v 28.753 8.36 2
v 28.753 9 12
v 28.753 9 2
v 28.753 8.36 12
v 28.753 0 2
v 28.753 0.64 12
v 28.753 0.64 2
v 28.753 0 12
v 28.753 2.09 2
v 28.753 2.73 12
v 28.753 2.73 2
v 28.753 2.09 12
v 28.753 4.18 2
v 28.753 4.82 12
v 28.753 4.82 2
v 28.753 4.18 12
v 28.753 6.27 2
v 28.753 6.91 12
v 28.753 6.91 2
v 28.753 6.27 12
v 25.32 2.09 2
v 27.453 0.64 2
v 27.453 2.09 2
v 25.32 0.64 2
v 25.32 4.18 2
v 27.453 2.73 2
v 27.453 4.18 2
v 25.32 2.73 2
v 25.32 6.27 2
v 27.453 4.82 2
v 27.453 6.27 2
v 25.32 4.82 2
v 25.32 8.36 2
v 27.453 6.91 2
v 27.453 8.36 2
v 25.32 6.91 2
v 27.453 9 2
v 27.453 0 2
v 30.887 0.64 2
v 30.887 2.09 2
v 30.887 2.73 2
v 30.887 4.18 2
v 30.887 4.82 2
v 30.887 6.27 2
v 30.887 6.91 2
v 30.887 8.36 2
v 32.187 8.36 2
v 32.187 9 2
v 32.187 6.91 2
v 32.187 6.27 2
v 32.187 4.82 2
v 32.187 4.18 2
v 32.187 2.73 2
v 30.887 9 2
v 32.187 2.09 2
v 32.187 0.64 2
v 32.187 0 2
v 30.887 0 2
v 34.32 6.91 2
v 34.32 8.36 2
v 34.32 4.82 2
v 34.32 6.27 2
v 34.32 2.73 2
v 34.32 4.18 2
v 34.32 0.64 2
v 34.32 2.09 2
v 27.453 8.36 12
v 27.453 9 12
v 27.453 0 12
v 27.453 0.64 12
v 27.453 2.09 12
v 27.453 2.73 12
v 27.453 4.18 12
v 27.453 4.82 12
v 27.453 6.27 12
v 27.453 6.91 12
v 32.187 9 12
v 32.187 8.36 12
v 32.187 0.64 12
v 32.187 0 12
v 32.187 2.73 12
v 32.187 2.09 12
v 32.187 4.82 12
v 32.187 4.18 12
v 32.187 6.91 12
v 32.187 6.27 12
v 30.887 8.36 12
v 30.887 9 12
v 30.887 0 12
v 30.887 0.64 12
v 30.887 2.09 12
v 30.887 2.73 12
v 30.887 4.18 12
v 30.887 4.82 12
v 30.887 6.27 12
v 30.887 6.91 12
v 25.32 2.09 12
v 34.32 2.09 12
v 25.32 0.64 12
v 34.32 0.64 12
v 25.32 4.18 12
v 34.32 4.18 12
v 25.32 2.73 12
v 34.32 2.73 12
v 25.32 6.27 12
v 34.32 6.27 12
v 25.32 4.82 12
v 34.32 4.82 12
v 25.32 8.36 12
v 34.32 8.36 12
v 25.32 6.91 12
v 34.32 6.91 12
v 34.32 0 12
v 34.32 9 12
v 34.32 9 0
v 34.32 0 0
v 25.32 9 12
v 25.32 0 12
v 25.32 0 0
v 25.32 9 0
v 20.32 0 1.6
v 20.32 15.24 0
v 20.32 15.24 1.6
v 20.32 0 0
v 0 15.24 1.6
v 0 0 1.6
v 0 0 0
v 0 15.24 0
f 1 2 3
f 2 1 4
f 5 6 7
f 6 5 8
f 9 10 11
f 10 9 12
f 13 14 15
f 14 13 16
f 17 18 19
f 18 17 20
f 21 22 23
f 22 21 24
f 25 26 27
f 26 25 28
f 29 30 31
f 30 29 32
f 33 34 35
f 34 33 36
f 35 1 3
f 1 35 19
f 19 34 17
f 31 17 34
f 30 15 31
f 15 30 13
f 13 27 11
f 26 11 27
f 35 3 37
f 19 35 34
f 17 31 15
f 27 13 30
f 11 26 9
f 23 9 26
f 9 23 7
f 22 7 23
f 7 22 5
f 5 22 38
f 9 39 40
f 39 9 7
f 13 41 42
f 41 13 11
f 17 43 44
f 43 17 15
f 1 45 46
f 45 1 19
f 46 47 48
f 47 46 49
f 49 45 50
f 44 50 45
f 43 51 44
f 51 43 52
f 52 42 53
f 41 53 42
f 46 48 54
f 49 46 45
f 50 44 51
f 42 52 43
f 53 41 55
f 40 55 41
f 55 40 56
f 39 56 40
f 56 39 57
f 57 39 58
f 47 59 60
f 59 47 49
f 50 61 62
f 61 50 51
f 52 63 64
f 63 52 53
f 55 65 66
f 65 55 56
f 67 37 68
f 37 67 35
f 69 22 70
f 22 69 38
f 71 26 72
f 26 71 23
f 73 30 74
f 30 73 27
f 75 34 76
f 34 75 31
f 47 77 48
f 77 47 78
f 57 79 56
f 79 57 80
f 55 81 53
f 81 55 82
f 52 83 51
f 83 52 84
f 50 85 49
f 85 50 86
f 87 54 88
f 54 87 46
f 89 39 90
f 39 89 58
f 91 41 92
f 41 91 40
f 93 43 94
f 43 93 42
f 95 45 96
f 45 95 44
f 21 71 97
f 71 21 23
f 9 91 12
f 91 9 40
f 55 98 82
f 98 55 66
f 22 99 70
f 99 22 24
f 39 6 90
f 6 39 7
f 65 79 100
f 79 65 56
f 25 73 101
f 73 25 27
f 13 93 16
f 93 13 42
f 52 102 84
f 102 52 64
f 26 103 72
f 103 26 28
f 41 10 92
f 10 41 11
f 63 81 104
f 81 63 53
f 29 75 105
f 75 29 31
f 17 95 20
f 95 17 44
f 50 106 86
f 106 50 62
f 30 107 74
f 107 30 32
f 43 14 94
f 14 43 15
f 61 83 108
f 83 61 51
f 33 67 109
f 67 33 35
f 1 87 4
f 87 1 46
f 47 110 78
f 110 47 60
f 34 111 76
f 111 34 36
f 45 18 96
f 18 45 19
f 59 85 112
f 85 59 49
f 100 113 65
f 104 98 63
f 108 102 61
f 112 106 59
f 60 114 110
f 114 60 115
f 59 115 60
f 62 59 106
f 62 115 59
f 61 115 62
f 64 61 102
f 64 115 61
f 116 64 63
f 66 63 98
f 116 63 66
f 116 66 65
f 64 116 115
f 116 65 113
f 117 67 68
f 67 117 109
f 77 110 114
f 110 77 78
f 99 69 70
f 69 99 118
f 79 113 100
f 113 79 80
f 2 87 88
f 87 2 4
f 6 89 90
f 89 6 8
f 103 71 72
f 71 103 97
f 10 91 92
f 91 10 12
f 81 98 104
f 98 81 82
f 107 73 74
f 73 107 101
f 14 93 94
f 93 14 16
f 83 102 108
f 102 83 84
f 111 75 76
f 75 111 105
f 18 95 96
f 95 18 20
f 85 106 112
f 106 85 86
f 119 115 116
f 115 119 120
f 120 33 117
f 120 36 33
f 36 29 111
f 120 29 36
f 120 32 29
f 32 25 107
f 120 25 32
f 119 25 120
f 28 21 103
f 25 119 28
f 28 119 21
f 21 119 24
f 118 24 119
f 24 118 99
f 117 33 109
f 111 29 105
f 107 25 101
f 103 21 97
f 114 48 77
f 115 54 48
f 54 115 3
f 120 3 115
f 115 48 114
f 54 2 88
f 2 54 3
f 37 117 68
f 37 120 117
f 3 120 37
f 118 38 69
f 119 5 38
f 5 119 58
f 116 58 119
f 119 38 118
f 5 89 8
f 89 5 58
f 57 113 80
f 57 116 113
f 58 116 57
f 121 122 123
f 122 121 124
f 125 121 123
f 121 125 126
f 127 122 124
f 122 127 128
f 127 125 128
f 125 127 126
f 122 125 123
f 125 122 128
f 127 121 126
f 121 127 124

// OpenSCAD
// file: ../settings/dimensions.scad
// Defualt Quality
$fn = 25;

// PCB Dimensions - mm
pcb_l = 109.67;
pcb_w = 84.30;
pcb_t = 1.6;

hole_dia = 3.2;
hole_x_spacing = 101.85;
hole_y_spacing = 76.10;

// PCB Component Locations - mm from center
usb_x = (-pcb_l/2) + 24.11;
usb_y = (-pcb_w/2);

uSD_x = (-pcb_l/2) + 42.46;
uSD_y = (-pcb_w/2) - 0.71;

// TMC2130 Dimensions - mm
tmc_l = 20.32;
tmc_w = 15.24;
tmc_t = 1.6;
// main file
include <../settings/dimensions.scad>

module tmc2130_pcb() {
    color("DimGrey") {
        cube([tmc_l, tmc_w, tmc_t]);
    }
}

module heatsink() {
    hs_l = 9.0;
    hs_w = 9.0;
    hs_h = 12.0;

    num_fin_y = 5;
    num_fin_x = 3;
    fin_spacing_x = 1.3;
    fin_thickness_x = (hs_l - ((num_fin_x-1)*fin_spacing_x))/num_fin_x;
    fin_spacing_y = 1.45;
    fin_thickness_y = (hs_w - ((num_fin_y-1)*fin_spacing_y))/num_fin_y;

    color("Blue") difference() {
        cube([hs_l, hs_w, hs_h]);

        for (x=[0:num_fin_x-2]) {
            translate([(x+1)*fin_thickness_x+x*fin_spacing_x,-1,2])cube([fin_spacing_x,hs_w+2,hs_h]);
        }

        for (y=[0:num_fin_y-2]) {
            translate([-1,(y+1)*fin_thickness_y+y*fin_spacing_y,2])cube([hs_l+2,fin_spacing_y,hs_h]);
        }
    }
}

tmc2130_pcb();
translate([tmc_l+5,0,0])heatsink();
